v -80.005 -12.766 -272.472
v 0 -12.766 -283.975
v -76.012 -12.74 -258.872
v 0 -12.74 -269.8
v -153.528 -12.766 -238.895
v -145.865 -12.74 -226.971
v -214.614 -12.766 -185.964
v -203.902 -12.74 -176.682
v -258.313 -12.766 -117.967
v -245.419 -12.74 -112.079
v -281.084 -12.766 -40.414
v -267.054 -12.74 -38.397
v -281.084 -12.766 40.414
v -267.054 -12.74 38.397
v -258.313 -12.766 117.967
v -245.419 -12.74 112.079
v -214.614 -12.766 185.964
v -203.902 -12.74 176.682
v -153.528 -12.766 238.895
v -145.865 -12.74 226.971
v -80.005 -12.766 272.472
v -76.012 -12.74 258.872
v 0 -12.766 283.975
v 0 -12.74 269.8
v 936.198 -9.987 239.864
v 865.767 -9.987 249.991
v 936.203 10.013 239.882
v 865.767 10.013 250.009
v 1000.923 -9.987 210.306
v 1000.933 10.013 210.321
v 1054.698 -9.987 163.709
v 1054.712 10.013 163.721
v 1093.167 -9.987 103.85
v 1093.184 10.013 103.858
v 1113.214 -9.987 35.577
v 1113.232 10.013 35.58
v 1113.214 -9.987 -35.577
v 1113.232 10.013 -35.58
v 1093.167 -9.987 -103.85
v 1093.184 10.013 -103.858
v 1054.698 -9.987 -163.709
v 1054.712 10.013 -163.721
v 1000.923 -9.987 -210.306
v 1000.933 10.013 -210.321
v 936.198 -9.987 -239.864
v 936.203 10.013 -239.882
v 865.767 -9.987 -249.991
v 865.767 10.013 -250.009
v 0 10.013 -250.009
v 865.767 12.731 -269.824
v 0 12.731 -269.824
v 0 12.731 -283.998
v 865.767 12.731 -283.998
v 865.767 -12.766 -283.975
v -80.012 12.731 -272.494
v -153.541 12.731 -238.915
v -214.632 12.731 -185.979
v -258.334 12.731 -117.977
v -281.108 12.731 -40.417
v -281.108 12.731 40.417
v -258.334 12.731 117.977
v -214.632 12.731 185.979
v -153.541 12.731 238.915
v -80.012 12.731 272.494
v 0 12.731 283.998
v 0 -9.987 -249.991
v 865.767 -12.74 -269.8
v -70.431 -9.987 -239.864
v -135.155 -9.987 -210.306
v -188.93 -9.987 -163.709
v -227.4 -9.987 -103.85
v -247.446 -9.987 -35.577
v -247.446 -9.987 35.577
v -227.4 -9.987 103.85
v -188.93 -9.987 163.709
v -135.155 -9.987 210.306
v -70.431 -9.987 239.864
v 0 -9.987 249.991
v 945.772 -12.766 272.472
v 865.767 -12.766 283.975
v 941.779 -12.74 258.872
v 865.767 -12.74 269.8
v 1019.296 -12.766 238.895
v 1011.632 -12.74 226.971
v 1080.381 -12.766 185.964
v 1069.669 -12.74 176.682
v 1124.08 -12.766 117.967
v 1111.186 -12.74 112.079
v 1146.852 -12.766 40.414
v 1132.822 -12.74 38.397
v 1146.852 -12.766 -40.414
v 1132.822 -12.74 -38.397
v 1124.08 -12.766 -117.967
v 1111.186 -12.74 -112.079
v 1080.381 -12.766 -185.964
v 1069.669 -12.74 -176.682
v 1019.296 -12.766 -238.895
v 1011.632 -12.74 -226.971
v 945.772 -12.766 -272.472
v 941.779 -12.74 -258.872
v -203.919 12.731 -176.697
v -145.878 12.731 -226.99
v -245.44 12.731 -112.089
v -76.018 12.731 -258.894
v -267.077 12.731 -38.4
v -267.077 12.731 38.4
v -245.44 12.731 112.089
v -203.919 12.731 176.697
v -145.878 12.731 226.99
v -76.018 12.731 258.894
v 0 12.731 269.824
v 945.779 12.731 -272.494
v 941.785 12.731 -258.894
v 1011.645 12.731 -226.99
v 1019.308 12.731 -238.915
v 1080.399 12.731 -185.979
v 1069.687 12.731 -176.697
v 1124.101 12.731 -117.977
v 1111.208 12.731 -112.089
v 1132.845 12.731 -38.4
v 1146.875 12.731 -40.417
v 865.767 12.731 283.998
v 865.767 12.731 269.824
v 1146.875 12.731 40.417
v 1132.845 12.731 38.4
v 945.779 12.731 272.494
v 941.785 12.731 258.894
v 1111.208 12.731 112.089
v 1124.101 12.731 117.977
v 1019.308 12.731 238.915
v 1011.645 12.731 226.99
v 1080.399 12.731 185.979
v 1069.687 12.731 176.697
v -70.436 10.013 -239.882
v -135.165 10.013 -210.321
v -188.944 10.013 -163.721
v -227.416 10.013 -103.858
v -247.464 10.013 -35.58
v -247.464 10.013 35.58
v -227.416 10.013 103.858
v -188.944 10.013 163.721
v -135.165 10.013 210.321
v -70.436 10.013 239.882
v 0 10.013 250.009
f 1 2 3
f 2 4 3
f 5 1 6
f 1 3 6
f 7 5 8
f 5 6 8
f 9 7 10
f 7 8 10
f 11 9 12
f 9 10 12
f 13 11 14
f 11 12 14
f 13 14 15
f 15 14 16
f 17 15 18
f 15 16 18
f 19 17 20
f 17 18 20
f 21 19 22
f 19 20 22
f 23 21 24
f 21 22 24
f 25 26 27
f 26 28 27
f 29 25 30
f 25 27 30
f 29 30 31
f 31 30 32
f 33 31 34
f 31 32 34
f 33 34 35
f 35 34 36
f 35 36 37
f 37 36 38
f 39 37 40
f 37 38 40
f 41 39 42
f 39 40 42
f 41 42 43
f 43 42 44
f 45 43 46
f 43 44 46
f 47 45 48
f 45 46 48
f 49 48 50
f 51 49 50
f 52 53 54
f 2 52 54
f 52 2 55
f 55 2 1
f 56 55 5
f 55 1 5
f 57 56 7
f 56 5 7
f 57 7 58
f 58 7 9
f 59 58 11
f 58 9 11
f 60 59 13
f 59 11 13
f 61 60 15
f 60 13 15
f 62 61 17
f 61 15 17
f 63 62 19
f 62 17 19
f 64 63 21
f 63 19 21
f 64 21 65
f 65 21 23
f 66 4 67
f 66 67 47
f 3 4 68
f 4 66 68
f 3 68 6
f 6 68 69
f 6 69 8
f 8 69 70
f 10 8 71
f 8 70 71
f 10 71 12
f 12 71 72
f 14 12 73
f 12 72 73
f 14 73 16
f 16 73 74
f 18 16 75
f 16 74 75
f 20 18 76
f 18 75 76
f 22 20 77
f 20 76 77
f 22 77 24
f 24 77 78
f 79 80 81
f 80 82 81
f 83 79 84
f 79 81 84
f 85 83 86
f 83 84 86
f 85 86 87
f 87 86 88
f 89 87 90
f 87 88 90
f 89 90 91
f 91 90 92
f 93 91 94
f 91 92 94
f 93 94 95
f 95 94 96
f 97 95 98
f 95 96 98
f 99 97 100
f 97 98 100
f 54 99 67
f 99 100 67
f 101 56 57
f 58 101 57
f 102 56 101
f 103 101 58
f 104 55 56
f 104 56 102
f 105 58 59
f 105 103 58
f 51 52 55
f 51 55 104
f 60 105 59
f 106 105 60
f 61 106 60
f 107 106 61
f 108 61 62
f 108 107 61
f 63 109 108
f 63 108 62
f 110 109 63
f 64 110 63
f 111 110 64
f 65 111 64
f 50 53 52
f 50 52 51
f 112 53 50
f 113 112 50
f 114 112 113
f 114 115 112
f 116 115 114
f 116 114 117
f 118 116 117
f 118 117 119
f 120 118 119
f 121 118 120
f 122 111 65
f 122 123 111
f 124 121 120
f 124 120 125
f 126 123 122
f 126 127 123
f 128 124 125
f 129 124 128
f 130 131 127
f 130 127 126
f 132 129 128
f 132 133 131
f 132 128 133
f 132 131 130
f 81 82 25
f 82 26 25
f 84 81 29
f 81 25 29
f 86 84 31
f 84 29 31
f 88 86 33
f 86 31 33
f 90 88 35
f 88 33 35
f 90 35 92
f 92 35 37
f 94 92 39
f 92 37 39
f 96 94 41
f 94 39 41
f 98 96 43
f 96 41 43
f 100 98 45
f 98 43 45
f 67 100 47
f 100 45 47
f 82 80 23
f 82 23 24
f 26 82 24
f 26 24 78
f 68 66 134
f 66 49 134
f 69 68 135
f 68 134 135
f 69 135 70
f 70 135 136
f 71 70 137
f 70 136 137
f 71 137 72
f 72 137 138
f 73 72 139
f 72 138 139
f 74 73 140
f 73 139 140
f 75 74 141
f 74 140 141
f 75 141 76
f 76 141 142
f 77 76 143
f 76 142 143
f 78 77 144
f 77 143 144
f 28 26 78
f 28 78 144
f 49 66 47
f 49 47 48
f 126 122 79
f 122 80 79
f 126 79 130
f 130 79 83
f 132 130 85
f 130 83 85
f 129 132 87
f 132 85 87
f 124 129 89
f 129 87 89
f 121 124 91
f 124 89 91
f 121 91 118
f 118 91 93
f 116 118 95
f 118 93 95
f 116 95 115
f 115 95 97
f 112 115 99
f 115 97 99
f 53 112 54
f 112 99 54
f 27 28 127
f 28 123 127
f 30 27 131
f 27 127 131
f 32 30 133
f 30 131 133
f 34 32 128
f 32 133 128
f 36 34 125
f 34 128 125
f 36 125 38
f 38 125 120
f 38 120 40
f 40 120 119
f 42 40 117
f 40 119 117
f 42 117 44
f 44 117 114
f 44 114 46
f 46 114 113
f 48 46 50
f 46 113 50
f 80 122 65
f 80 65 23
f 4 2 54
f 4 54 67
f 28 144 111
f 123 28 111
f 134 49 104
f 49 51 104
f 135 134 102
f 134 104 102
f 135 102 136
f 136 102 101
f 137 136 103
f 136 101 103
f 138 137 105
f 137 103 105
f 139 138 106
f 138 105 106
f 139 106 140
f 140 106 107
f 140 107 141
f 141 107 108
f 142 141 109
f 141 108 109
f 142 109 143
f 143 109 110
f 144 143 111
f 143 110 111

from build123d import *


with BuildPart() as f2:
    # F2: sweep along a path in F1
    with BuildLine(Plane.XZ) as f2_path:
        Line((0, 266.9991701841), (865.7673536606, 266.9991701841))
        ThreePointArc((865.7673536606, 266.9991701841), (1132.7665238447, 0), (865.7673536606, -266.9991701841))
        Line((865.7673536606, -266.9991701841), (0, -266.9991701841))
        ThreePointArc((0, -266.9991701841), (-266.9991701841, 0), (0, 266.9991701841))
    # F0 (on Right) → F2 (sweep)
    with BuildSketch(Plane.YZ):
        Polygon((10.0134903274, 250.0092067223), (12.7307107569, 269.8237648334), (12.7307107569, 283.9983403683), (-12.7660859497, 283.9749474953), (-12.7400761126, 269.800395824), (-9.9865012549, 249.9908570736), align=None)
    sweep(path=f2_path.line)


solid = f2.part
